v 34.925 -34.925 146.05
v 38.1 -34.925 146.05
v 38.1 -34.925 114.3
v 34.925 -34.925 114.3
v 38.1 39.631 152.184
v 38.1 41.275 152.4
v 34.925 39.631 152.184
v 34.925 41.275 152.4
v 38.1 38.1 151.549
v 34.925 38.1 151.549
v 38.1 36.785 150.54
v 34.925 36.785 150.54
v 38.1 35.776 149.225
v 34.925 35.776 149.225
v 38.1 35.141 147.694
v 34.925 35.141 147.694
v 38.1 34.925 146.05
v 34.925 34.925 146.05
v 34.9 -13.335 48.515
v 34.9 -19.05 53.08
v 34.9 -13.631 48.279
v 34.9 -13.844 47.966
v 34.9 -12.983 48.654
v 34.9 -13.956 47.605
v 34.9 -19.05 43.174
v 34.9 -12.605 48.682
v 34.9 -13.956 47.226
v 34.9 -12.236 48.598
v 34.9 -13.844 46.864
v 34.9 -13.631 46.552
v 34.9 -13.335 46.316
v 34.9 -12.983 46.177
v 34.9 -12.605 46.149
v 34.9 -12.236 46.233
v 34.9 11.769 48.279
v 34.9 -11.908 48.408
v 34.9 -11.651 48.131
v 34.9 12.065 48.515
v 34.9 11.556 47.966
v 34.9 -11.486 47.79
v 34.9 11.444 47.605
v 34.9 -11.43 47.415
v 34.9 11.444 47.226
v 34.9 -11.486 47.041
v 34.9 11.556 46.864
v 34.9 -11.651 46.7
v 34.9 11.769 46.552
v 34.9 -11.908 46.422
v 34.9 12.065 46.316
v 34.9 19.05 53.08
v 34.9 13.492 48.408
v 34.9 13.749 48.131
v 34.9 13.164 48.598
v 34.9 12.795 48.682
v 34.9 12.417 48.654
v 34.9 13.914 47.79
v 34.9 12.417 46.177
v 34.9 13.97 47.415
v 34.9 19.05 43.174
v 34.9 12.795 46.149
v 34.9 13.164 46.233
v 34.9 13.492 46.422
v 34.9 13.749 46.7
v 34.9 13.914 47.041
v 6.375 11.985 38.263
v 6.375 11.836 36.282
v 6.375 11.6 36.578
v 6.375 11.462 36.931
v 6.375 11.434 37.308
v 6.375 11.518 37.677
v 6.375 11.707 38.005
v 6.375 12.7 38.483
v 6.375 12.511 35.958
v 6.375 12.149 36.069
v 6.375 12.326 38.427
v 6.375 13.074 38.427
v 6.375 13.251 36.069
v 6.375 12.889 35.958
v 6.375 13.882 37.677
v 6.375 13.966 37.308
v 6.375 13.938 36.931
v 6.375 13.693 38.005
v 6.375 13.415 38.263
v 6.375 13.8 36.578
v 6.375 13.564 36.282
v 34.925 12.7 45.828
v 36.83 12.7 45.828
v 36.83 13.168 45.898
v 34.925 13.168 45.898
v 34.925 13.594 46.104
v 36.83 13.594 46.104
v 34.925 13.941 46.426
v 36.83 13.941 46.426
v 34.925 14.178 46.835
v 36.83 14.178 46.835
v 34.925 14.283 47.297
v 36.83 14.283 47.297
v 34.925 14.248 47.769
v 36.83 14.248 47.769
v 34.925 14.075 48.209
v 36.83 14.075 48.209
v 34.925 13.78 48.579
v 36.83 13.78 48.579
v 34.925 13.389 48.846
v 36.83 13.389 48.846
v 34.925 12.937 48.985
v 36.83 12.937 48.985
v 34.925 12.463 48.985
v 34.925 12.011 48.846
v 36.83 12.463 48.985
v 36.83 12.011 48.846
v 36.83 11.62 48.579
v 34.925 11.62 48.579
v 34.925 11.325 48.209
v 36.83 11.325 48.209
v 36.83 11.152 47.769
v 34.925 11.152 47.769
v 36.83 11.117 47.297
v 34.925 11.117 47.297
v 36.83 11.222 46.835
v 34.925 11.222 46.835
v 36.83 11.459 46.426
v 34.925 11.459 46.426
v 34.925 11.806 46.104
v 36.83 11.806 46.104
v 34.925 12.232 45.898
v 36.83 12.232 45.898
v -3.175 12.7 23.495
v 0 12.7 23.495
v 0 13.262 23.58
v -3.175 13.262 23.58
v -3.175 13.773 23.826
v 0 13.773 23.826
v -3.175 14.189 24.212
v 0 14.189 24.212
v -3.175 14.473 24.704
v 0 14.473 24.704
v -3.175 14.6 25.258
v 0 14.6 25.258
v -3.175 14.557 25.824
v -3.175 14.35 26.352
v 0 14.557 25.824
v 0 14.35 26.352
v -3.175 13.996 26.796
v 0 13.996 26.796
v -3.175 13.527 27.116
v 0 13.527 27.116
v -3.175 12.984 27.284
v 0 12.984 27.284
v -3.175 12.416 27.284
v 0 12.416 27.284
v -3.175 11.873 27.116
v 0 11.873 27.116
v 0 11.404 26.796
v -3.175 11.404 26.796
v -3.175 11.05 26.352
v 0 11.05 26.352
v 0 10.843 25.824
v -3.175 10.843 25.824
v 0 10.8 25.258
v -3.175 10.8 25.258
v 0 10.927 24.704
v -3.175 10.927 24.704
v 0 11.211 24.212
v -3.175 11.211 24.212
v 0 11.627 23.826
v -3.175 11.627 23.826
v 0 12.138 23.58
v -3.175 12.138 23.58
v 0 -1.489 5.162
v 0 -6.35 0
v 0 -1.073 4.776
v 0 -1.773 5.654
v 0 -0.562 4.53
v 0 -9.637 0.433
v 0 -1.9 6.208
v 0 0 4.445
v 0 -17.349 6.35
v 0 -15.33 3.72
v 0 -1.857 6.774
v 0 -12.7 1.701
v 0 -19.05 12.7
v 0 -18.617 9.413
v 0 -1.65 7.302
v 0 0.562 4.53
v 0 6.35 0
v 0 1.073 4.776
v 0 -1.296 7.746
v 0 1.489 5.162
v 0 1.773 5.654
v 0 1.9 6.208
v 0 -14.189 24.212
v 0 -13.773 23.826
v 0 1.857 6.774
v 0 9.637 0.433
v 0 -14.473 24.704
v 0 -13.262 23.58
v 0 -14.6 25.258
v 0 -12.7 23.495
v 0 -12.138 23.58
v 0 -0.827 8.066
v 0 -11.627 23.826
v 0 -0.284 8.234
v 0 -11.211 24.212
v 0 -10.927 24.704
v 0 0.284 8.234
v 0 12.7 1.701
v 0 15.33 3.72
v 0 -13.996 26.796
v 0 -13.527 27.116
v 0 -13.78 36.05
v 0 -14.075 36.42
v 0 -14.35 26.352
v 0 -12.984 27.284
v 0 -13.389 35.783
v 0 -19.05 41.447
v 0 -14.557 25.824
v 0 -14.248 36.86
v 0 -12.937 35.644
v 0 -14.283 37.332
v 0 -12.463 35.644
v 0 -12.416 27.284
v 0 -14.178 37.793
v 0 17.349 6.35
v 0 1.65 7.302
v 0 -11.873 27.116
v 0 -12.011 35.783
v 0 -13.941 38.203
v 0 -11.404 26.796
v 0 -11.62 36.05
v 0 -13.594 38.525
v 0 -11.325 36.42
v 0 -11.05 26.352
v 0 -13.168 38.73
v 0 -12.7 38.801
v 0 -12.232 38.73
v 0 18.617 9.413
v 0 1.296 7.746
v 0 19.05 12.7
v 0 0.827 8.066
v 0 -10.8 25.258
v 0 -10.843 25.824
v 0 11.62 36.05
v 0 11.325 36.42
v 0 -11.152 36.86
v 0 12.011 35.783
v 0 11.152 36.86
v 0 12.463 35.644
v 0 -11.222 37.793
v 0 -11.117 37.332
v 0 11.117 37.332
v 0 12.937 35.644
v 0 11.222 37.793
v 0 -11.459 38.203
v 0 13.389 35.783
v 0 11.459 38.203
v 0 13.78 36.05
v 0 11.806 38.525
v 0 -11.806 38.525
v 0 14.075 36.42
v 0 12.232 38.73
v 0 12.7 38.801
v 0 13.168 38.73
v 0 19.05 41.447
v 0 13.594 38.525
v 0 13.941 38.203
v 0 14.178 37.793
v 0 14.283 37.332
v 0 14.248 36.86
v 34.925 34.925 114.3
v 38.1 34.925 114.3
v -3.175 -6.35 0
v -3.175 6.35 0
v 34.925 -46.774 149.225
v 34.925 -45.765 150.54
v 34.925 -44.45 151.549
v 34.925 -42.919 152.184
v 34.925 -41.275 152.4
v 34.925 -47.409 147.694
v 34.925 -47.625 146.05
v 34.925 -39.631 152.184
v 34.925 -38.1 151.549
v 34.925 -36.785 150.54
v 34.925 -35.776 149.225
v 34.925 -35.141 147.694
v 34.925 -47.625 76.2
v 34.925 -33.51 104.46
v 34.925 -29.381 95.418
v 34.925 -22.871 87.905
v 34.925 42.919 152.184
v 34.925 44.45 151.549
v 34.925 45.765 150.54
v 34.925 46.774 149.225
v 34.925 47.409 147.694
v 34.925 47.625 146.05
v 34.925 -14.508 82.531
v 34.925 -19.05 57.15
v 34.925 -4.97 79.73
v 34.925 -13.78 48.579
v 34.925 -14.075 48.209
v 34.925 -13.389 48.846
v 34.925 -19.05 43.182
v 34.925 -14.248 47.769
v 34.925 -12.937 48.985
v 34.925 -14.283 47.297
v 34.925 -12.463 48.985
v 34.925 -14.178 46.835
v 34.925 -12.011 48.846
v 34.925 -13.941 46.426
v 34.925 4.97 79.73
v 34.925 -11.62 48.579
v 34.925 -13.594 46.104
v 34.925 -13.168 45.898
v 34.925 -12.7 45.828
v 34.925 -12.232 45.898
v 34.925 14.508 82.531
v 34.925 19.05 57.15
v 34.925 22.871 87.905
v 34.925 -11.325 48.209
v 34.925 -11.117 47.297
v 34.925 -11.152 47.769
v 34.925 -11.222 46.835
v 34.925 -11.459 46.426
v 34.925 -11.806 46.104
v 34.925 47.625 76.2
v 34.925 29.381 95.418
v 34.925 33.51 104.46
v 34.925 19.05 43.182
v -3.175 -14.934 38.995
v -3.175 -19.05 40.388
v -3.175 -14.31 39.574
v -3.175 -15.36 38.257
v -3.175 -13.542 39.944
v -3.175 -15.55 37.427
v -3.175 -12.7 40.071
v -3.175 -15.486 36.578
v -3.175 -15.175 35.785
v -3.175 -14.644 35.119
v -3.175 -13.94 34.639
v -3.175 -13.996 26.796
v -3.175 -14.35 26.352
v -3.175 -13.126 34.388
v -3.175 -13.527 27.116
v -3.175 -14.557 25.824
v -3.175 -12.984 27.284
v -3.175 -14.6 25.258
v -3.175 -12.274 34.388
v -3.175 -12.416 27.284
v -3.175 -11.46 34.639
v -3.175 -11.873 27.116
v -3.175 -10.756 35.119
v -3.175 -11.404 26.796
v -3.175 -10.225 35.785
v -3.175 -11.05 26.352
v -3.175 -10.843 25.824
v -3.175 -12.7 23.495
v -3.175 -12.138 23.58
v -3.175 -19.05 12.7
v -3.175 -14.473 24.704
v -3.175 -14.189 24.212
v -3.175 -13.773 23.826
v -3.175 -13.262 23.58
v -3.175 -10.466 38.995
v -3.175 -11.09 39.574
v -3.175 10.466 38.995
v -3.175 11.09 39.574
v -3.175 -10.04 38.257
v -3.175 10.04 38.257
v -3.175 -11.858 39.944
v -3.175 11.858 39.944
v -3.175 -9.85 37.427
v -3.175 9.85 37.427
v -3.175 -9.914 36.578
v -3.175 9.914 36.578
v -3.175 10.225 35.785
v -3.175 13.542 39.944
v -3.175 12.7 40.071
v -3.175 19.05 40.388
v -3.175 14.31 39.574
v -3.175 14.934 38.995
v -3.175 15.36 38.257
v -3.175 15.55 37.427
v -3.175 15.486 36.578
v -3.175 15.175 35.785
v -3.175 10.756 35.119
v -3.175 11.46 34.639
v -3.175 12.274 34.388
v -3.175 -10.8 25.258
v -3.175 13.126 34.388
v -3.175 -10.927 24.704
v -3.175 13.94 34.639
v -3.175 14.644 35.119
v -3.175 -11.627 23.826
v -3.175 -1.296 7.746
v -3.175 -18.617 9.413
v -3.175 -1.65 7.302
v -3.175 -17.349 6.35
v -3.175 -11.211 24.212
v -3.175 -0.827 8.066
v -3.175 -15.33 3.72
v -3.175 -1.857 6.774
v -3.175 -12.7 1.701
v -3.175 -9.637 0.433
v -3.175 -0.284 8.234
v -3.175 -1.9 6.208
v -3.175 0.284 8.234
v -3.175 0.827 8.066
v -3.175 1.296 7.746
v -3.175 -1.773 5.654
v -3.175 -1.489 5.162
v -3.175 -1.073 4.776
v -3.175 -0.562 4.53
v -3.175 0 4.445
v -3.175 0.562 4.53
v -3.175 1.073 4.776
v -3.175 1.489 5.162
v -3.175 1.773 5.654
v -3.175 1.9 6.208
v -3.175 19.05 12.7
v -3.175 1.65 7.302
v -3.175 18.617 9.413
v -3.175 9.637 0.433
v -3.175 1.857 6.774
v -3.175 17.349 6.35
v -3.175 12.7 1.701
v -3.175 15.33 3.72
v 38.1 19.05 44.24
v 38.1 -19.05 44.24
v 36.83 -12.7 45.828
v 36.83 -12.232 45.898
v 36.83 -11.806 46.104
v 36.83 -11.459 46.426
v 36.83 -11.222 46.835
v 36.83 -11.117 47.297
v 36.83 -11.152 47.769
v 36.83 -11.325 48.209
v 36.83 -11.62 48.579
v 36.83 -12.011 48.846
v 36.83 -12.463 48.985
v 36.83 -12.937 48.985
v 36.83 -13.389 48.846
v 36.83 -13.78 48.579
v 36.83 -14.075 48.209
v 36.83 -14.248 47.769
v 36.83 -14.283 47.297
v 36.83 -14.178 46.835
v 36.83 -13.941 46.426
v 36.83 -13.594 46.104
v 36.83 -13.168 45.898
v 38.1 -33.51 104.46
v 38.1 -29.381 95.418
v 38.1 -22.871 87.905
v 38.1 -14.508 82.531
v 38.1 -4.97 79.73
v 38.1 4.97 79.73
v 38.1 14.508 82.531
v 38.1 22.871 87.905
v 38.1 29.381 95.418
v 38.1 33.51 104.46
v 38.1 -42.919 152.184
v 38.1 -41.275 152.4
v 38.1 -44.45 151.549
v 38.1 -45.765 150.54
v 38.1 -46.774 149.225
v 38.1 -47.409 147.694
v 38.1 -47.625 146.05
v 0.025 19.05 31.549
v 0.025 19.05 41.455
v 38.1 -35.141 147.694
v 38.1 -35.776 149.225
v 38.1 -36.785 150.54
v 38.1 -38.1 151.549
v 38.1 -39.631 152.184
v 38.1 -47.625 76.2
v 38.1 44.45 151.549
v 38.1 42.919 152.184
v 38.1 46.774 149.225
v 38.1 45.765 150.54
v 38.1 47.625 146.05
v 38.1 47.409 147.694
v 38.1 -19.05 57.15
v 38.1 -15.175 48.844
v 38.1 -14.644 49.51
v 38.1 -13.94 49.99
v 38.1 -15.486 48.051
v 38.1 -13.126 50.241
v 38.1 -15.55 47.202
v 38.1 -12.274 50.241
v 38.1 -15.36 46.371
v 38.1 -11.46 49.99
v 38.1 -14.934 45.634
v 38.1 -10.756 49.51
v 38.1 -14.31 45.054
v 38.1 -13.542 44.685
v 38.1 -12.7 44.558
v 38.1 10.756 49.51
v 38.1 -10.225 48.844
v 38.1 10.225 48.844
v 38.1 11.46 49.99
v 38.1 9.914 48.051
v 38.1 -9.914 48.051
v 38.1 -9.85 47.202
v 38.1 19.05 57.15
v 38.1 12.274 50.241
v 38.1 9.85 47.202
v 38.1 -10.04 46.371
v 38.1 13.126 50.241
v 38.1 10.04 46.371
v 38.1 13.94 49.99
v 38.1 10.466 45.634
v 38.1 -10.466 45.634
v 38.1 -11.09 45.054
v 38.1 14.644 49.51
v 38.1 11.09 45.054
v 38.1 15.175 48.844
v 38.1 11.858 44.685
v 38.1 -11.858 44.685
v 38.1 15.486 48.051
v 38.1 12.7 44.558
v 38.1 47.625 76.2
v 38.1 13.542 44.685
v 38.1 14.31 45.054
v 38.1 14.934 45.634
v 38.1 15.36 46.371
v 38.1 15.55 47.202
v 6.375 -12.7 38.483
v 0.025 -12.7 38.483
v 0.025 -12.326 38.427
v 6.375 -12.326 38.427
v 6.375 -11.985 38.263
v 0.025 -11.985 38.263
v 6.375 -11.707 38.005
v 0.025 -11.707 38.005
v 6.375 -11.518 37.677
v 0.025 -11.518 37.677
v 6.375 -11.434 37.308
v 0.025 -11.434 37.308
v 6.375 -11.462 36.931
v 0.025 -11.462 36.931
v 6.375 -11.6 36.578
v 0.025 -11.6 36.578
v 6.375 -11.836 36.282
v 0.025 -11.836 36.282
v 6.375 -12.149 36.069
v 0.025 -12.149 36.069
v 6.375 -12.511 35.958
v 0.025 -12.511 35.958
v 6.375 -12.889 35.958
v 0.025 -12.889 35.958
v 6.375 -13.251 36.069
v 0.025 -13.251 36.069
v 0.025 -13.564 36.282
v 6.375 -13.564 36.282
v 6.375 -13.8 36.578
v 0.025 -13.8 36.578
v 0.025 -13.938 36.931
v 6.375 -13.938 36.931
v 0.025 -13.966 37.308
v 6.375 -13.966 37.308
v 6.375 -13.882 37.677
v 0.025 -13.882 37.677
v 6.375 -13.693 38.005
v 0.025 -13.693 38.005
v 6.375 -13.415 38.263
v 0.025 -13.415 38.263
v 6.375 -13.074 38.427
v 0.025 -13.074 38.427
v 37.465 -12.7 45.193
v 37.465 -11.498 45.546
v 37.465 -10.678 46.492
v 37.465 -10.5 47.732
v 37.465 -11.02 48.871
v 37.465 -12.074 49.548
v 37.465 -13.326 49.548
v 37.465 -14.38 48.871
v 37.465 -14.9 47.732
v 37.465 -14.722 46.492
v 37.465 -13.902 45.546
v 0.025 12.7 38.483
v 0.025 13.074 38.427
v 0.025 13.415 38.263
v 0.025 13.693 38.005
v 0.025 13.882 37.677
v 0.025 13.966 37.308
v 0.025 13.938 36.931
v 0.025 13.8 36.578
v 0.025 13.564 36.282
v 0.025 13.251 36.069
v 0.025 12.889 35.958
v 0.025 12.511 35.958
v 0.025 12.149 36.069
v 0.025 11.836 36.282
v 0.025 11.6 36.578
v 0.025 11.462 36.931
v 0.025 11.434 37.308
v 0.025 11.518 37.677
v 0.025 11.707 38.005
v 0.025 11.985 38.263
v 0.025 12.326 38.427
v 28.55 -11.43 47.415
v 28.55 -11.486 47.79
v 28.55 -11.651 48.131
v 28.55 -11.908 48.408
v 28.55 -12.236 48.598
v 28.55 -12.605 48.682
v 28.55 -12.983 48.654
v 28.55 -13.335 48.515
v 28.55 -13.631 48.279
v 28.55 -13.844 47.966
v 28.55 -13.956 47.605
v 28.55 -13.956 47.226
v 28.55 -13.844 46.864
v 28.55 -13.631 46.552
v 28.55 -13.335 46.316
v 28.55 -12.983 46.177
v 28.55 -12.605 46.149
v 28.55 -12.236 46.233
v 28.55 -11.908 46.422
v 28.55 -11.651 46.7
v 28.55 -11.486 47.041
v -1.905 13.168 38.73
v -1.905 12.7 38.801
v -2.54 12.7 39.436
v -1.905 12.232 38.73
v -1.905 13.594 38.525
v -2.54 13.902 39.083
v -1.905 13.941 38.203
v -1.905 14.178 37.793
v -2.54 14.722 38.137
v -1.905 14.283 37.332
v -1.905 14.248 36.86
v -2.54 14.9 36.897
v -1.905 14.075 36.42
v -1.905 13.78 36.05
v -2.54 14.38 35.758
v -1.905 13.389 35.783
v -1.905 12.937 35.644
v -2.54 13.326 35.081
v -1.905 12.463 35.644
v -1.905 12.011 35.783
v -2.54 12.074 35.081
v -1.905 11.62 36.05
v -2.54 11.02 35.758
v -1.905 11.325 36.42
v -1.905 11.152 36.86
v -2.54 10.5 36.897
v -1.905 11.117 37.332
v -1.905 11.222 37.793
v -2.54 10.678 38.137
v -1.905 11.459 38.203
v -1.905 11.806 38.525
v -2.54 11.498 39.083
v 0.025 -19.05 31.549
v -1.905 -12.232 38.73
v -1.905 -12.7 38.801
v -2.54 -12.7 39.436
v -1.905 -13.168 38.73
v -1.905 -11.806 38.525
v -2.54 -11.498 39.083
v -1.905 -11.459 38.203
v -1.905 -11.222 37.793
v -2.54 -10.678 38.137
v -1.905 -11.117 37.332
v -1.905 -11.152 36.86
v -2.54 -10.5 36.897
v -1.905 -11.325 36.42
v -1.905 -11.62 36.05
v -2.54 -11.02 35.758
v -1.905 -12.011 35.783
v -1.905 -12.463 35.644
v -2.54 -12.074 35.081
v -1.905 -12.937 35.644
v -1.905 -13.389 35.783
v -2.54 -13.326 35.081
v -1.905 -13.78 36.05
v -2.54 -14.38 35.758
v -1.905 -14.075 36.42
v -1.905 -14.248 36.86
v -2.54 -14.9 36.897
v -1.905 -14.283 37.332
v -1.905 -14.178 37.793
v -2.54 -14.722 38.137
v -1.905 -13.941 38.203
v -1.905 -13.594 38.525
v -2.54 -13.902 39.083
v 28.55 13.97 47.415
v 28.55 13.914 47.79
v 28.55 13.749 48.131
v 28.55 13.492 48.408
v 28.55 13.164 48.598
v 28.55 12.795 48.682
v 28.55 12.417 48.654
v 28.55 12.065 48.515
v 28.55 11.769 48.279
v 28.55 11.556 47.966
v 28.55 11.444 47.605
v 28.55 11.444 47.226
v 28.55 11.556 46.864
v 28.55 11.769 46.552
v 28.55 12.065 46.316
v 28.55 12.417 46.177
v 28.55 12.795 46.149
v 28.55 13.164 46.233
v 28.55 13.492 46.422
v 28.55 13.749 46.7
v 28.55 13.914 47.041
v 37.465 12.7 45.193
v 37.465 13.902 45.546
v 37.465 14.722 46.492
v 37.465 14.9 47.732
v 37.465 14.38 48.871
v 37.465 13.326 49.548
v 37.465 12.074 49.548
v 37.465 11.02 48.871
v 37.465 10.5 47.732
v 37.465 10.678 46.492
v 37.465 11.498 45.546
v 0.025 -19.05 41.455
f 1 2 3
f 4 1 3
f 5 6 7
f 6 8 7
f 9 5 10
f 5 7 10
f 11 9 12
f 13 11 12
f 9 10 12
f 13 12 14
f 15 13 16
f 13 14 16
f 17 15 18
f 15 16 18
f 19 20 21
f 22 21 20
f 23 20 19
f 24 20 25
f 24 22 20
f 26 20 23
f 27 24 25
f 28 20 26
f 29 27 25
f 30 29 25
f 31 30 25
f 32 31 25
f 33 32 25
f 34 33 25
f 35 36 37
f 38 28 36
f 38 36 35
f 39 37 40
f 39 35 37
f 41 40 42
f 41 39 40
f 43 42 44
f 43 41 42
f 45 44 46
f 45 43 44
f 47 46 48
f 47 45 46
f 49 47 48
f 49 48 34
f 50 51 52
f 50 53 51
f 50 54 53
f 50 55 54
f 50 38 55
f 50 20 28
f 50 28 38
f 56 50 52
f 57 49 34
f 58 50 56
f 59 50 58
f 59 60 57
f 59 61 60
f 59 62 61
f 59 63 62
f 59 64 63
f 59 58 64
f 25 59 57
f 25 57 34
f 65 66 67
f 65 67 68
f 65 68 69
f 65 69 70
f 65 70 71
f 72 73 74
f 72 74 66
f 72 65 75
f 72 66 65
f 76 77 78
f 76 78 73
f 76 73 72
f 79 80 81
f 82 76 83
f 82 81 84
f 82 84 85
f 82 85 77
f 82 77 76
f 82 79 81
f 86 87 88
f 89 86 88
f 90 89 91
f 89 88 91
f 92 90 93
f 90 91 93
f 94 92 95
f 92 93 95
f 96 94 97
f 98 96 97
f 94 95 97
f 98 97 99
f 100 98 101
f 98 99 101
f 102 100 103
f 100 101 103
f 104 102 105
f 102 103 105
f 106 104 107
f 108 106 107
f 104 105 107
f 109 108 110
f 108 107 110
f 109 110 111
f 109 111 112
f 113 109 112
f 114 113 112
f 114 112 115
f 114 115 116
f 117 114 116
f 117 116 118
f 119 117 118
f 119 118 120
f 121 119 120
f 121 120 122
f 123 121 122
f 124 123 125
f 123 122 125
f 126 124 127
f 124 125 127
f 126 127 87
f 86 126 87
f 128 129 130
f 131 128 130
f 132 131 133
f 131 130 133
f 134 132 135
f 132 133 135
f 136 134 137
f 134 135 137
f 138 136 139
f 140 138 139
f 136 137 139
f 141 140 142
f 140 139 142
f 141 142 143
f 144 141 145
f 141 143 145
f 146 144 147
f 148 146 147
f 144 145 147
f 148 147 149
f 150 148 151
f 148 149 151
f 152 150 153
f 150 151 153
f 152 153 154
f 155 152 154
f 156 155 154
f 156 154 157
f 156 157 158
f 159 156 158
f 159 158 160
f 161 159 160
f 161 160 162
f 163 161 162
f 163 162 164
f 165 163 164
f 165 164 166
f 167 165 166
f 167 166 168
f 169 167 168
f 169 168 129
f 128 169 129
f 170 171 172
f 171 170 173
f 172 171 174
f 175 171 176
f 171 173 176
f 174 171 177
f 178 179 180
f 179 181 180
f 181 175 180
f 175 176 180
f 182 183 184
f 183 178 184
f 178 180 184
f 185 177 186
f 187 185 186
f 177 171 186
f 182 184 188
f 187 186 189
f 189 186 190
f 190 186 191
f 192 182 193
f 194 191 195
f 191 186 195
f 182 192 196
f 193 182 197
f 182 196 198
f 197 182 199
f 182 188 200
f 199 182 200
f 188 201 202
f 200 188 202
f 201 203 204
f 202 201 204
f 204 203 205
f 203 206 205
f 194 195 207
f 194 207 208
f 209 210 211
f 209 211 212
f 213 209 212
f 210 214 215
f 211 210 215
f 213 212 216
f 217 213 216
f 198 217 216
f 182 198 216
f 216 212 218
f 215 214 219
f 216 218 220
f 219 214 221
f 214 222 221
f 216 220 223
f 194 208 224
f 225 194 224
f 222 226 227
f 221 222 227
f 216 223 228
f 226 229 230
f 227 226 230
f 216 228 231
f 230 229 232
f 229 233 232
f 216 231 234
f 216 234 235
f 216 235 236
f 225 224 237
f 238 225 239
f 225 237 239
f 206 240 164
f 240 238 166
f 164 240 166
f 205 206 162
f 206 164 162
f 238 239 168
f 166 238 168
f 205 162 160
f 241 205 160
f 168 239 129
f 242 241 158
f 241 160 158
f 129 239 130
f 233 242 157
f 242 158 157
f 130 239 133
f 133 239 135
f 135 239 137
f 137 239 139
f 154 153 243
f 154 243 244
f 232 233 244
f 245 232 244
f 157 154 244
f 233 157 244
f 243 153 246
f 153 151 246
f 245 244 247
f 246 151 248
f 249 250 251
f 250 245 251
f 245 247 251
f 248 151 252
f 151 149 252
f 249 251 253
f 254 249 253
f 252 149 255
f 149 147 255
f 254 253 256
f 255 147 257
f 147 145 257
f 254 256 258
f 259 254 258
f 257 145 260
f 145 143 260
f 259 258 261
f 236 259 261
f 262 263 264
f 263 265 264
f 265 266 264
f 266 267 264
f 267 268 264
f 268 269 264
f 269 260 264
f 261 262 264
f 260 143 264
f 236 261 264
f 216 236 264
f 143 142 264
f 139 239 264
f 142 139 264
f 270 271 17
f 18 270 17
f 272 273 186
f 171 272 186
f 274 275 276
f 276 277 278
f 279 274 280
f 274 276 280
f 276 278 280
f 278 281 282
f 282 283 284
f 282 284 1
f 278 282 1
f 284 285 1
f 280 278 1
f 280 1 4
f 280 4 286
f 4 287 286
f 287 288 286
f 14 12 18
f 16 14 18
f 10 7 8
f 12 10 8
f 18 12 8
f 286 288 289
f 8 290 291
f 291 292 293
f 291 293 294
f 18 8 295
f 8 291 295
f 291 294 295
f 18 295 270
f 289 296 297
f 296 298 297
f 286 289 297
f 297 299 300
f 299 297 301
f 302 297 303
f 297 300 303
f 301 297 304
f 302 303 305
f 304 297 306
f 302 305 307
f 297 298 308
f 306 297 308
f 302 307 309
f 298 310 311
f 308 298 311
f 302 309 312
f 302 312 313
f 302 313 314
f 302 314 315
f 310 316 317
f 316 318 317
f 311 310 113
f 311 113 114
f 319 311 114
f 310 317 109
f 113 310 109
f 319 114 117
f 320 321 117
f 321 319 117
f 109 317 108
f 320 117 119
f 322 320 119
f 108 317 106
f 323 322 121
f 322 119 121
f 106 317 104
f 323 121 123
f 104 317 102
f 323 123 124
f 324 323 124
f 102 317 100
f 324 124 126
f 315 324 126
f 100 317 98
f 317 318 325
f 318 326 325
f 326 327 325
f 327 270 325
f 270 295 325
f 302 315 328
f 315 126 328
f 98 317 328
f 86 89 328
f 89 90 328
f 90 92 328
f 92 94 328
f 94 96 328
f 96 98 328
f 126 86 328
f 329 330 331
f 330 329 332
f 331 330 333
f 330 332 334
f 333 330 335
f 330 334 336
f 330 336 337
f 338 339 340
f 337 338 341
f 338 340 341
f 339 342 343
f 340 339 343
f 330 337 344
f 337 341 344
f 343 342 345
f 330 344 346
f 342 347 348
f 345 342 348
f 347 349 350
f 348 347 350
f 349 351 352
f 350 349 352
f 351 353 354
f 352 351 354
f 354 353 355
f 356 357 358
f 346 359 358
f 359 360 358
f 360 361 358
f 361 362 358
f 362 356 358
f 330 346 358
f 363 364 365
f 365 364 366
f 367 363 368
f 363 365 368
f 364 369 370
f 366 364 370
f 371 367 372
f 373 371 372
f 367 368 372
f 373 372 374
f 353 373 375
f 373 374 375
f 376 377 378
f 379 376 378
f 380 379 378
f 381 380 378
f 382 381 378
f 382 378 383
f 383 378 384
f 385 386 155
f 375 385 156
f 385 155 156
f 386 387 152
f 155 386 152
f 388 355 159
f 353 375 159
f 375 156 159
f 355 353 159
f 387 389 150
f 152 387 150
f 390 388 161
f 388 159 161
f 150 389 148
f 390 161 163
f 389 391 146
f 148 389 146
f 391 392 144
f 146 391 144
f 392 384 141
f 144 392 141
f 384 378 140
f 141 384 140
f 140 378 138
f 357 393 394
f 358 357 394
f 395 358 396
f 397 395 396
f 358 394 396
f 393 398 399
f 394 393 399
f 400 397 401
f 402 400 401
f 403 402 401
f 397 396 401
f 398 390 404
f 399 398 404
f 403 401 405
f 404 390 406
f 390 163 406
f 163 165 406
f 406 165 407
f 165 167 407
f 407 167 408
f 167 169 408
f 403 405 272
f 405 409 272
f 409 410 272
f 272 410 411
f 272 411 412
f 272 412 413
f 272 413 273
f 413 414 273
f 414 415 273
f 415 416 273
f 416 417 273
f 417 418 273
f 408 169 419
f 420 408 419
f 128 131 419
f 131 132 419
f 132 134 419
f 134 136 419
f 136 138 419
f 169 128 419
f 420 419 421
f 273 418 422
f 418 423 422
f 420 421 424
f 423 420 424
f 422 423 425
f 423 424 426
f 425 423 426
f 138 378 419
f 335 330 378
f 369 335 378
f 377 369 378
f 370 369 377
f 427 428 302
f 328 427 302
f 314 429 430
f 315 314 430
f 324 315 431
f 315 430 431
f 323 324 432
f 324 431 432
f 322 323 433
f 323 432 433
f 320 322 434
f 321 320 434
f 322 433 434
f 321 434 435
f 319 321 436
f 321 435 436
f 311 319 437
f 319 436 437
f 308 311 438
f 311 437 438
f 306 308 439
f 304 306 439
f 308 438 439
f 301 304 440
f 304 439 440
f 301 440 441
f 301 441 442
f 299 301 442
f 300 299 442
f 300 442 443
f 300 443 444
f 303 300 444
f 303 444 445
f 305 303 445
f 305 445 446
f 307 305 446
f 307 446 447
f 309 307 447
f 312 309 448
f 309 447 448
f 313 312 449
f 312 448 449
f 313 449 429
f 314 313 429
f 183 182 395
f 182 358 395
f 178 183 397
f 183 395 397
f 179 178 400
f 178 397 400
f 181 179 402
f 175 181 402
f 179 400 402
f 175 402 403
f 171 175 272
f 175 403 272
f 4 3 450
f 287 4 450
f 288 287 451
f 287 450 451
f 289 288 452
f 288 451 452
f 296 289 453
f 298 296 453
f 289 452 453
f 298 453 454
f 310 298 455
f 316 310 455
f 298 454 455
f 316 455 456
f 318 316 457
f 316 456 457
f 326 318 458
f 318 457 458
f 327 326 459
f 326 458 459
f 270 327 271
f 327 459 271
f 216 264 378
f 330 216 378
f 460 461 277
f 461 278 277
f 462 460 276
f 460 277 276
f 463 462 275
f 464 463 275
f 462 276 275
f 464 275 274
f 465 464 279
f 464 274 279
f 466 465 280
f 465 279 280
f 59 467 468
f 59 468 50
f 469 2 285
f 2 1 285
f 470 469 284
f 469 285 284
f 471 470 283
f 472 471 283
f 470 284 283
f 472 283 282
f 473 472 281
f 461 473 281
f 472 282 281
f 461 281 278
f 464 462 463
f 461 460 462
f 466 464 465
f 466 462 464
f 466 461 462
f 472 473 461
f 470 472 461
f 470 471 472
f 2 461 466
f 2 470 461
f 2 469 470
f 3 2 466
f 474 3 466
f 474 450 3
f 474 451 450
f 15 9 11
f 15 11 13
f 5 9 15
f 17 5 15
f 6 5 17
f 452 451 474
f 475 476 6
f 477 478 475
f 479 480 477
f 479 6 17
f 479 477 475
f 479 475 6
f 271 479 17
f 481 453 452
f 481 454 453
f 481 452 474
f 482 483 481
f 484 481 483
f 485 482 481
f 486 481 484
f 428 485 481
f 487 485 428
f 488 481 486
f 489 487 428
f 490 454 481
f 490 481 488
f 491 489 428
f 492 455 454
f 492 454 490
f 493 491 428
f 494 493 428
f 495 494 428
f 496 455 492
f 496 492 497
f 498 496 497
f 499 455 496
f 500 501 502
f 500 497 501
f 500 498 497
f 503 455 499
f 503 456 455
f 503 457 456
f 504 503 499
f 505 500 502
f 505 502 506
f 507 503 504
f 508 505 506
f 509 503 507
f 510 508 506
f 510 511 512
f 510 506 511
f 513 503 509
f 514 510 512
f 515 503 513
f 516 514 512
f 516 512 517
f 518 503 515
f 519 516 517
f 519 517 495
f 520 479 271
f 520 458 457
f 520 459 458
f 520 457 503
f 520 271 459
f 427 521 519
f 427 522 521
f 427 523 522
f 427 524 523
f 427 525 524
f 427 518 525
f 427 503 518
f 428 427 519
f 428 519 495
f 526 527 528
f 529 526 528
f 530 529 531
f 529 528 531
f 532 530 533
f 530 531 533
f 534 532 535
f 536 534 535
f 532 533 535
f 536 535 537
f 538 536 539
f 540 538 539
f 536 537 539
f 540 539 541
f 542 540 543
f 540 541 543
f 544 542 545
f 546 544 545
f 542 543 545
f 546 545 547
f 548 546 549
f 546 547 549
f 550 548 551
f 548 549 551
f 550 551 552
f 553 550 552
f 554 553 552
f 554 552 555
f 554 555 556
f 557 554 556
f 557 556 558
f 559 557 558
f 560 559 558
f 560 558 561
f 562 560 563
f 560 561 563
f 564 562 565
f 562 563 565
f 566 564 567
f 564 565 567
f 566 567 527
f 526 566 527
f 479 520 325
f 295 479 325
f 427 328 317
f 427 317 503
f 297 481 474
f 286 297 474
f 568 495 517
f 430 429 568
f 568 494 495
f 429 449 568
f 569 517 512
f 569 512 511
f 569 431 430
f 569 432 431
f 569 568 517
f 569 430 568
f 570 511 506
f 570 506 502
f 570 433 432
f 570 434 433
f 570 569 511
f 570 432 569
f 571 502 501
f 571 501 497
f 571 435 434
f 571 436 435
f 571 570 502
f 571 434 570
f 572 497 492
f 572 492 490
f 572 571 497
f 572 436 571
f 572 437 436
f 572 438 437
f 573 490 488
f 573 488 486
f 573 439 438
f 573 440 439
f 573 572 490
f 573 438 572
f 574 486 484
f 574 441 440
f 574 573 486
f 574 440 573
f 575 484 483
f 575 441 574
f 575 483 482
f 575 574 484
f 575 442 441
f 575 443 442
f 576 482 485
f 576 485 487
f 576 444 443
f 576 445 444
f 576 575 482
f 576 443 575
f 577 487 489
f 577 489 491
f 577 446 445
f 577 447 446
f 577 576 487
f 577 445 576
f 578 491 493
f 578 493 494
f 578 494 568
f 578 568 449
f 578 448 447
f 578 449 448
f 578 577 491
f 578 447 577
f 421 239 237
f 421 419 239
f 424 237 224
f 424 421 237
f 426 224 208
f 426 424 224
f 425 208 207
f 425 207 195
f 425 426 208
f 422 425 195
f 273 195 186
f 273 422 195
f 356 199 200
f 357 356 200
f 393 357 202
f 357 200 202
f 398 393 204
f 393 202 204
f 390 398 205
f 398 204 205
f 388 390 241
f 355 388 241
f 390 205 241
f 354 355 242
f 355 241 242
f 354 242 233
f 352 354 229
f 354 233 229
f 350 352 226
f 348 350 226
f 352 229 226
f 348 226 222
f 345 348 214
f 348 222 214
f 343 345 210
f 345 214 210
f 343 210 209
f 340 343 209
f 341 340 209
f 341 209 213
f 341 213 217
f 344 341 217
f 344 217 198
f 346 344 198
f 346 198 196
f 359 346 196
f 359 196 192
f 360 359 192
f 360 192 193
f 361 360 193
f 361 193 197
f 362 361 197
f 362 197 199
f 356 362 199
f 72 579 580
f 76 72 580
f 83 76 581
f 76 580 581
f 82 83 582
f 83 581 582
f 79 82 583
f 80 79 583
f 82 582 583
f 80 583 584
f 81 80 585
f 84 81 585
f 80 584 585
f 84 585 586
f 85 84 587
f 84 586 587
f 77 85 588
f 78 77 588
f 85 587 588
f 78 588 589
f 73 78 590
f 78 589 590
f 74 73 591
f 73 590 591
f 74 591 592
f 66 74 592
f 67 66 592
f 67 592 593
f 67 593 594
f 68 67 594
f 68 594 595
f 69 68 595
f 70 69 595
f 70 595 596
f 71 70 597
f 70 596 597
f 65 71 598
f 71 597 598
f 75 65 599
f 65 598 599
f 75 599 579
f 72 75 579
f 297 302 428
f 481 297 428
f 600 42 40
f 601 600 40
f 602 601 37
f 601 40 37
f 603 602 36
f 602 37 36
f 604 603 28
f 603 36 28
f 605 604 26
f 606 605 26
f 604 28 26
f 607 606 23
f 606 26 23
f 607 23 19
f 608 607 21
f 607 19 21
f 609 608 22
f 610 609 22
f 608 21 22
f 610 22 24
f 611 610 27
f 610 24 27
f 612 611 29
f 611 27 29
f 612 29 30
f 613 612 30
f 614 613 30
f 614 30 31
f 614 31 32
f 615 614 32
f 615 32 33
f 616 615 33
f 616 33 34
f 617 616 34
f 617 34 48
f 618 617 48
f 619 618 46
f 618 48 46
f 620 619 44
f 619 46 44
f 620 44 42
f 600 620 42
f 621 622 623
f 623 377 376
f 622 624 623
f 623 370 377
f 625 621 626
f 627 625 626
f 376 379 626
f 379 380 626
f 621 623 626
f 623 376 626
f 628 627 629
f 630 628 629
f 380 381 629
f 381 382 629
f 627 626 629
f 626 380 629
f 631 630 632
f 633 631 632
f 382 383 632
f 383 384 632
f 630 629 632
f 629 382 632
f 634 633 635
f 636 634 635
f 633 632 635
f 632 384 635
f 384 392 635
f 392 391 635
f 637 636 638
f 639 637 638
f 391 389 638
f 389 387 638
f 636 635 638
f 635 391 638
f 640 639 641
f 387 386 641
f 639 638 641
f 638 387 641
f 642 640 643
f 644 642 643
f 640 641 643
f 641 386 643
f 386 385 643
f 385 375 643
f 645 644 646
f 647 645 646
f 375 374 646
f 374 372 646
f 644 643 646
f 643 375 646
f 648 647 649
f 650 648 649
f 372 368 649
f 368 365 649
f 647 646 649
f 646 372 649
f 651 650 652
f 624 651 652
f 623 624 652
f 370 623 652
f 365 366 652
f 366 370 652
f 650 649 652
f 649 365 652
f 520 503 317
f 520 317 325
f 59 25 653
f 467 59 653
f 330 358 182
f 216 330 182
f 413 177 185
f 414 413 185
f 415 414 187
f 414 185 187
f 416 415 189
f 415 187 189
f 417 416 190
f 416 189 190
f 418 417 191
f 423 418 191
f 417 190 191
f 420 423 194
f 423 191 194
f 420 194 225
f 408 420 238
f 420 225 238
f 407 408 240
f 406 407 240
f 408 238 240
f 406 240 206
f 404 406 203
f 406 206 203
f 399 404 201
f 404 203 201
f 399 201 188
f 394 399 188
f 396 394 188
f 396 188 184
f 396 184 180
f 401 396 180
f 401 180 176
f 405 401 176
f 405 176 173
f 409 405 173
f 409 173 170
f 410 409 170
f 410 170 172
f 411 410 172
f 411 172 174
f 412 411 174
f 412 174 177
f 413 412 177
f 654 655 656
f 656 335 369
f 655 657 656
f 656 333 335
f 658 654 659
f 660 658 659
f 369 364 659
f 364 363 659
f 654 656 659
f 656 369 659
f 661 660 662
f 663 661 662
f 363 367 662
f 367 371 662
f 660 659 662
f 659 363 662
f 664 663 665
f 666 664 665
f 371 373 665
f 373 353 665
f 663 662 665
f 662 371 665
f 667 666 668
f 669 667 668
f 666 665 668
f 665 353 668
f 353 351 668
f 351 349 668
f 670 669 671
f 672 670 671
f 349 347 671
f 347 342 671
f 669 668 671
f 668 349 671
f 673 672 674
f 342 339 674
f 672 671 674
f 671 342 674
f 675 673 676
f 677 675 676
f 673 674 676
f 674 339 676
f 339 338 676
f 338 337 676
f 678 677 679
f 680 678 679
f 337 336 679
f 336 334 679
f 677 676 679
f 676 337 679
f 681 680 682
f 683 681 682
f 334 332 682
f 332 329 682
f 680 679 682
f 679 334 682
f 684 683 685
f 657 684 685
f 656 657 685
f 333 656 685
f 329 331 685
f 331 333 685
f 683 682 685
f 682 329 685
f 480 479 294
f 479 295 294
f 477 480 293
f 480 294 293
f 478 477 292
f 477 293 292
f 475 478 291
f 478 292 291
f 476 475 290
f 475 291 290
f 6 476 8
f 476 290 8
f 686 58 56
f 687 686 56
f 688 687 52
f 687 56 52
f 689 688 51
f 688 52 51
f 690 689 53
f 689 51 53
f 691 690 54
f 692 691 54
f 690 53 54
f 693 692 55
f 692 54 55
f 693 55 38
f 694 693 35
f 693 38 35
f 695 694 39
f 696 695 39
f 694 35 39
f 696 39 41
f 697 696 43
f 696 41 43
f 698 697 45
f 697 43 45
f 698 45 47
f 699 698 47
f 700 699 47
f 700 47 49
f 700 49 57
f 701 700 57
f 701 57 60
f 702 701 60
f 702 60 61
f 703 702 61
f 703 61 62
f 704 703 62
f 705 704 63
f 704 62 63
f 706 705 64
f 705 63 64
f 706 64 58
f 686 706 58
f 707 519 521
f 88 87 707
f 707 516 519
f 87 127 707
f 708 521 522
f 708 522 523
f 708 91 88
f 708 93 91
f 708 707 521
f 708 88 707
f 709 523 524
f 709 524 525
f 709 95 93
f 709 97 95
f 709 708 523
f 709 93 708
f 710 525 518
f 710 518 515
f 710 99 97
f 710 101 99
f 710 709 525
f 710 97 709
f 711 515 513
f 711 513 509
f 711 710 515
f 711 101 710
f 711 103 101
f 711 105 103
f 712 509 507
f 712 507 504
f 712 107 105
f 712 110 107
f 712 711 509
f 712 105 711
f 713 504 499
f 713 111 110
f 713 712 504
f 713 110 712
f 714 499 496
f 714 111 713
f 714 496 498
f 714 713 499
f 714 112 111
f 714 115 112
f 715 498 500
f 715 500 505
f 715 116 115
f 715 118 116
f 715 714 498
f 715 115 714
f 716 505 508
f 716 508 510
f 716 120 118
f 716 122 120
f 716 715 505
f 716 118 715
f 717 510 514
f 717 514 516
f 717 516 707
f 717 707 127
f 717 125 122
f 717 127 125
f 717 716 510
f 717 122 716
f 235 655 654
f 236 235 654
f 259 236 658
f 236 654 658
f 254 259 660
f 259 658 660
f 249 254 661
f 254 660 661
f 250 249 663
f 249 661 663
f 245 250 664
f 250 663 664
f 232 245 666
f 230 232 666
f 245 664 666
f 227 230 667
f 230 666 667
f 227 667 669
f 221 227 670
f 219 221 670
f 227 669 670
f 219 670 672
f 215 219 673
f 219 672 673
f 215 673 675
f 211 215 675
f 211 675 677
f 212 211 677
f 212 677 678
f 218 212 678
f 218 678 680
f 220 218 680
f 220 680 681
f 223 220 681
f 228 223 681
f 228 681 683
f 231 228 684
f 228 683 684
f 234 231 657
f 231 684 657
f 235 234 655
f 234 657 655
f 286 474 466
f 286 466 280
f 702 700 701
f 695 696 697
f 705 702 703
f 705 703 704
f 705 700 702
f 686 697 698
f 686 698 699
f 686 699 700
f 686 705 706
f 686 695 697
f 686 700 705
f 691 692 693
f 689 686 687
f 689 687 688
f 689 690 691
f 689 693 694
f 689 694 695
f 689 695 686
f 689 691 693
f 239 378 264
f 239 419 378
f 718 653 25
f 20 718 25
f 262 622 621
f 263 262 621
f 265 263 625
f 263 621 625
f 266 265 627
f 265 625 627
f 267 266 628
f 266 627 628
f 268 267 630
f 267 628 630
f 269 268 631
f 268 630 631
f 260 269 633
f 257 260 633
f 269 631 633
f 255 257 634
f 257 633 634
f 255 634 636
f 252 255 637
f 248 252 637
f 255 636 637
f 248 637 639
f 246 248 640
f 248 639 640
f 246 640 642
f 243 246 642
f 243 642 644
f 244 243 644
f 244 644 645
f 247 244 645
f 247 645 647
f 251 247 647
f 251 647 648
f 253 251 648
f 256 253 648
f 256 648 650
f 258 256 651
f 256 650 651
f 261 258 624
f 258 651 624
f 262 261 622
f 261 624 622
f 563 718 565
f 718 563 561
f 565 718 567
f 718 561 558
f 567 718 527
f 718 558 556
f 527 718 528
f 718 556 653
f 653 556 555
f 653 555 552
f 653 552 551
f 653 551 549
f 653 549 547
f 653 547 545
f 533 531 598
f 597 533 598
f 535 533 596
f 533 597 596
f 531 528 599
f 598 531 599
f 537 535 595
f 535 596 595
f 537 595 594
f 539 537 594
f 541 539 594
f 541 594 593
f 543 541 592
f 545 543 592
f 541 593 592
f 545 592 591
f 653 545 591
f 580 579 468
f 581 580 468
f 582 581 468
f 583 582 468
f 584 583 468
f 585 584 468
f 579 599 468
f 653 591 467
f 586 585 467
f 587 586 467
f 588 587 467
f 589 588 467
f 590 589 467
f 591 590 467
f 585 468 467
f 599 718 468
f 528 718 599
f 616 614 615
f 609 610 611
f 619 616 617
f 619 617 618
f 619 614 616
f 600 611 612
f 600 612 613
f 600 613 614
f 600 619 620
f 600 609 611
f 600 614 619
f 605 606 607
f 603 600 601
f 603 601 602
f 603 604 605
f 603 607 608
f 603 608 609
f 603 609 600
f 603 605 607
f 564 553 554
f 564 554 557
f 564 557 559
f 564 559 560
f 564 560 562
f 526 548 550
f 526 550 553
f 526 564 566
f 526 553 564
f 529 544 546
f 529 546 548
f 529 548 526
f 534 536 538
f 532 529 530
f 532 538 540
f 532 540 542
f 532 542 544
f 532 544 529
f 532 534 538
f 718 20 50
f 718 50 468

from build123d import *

# Parameters (mm, degrees)
BOSS_EXTRUDE1_DEPTH = 47.625
CUT_EXTRUDE1_DEPTH  = 165.916725198
FILLET1_R           = 6.35
FILLET2_R           = 12.7
CUT_EXTRUDE2_REACH  = 166.151
SKETCH3_R           = 1.905
BOSS_EXTRUDE2_DEPTH = 38.1
SKETCH6_W           = 0.0254
SKETCH6_H           = 12.687385225
SKETCH6_H_2         = 17.118946269
CUT_EXTRUDE3_DEPTH  = 171.65440406
SKETCH7_R           = 1.5875
CUT_EXTRUDE4_DEPTH  = 3.175
SKETCH8_R           = 1.27
CUT_EXTRUDE5_DEPTH  = 6.35
SKETCH9_R           = 1.5875
CUT_EXTRUDE6_DEPTH  = 3.175
SKETCH10_R          = 1.27
CUT_EXTRUDE7_DEPTH  = 6.35
CHAMFER1_SIZE       = 1.27
CHAMFER2_SIZE       = 1.27


with BuildPart() as part:
    # Sketch1 → Boss-Extrude1 (new, symmetric)
    with BuildSketch(Plane(origin=(0, 0, 0), x_dir=(1, 0, 0), z_dir=(0, 1, 0))):
        Polygon((0, 0), (0, -38.1), (38.1, -50.8), (38.1, -152.4), (34.925, -152.4), (34.925, -53.088410524), (-3.175, -40.388410524), (-3.175, 0), align=None)
    extrude(amount=BOSS_EXTRUDE1_DEPTH, both=True)

    # Sketch2 → Cut-Extrude1 (cut, through all)
    with BuildSketch(Plane(origin=(38.1, 0, 0), x_dir=(0, 0, -1), z_dir=(1, 0, 0))):
        with BuildLine():
            Line((-114.3, 34.925), (-152.4, 34.925))
            Line((-152.4, 34.925), (-152.4, -34.925))
            Line((-152.4, -34.925), (-114.3, -34.925))
            ThreePointArc((-114.3, -34.925), (-79.375, 0), (-114.3, 34.925))
        make_face()
        Polygon((0, 19.05), (-57.15, 19.05), (-76.2, 47.625), (0, 47.625), align=None)
        Polygon((0, -47.625), (0, -19.05), (-57.15, -19.05), (-76.2, -47.625), align=None)
    extrude(amount=-CUT_EXTRUDE1_DEPTH, mode=Mode.SUBTRACT)

    # Fillet1
    fillet1_edges = [part.edges().sort_by_distance(p)[0] for p in [
        (36.5125, -47.625, 152.4),
        (36.5125, -34.925, 152.4),
        (36.5125, 47.625, 152.4),
        (36.5125, 34.925, 152.4),
    ]]
    fillet(fillet1_edges, radius=FILLET1_R - 0.0001)  # a hair under: the kernel refuses the full size

    # Fillet2
    fillet2_edges = [part.edges().sort_by_distance(p)[0] for p in [
        (-1.5875, 19.05, 0),
        (-1.5875, -19.05, 0),
    ]]
    fillet(fillet2_edges, radius=FILLET2_R)

    # Sketch3 → Cut-Extrude2 (cut, up to next)
    with BuildSketch(Plane(origin=(0, 0, 0), x_dir=(0, 0, -1), z_dir=(1, 0, 0)), mode=Mode.PRIVATE) as cut_extrude2_sk1:
        with Locations((-25.4, 12.7)):
            Circle(SKETCH3_R)
    cut_extrude2_tool1 = extrude(cut_extrude2_sk1.sketch, amount=-CUT_EXTRUDE2_REACH, mode=Mode.PRIVATE) & part.part
    # Sketch3 → Cut-Extrude2 (cut, up to next)
    with BuildSketch(Plane(origin=(0, 0, 0), x_dir=(0, 0, -1), z_dir=(1, 0, 0)), mode=Mode.PRIVATE) as cut_extrude2_sk2:
        with Locations((-6.35, 0)):
            Circle(SKETCH3_R)
    cut_extrude2_tool2 = extrude(cut_extrude2_sk2.sketch, amount=-CUT_EXTRUDE2_REACH, mode=Mode.PRIVATE) & part.part
    # Sketch3 → Cut-Extrude2 (cut, up to next)
    with BuildSketch(Plane(origin=(0, 0, 0), x_dir=(0, 0, -1), z_dir=(1, 0, 0)), mode=Mode.PRIVATE) as cut_extrude2_sk3:
        with Locations((-25.4, -12.7)):
            Circle(SKETCH3_R)
    cut_extrude2_tool3 = extrude(cut_extrude2_sk3.sketch, amount=-CUT_EXTRUDE2_REACH, mode=Mode.PRIVATE) & part.part
    add(cut_extrude2_tool1.solids().sort_by_distance((0, 12.7, 25.4))[0], mode=Mode.SUBTRACT)
    add(cut_extrude2_tool2.solids().sort_by_distance((0, 0, 6.35))[0], mode=Mode.SUBTRACT)
    add(cut_extrude2_tool3.solids().sort_by_distance((0, -12.7, 25.4))[0], mode=Mode.SUBTRACT)

    # Sketch5 → Boss-Extrude2 (add)
    with BuildSketch(Plane(origin=(0, 19.05, 0), x_dir=(1, 0, 0), z_dir=(0, 1, 0))):
        Polygon((38.1, -50.8), (38.1, -44.24038204), (0, -31.54038204), (0, -38.1), align=None)
    extrude(amount=-BOSS_EXTRUDE2_DEPTH)

    # Sketch6 → Cut-Extrude3 (cut, through all)
    with BuildSketch(Plane(origin=(0, 19.05, 0), x_dir=(1, 0, 0), z_dir=(0, 1, 0))):
        with Locations((34.9123, -46.744717912)):
            Rectangle(SKETCH6_W, SKETCH6_H)
        with Locations((0.0127, -40.099855175)):
            Rectangle(SKETCH6_W, SKETCH6_H_2)
    extrude(amount=-CUT_EXTRUDE3_DEPTH, mode=Mode.SUBTRACT)


with BuildPart() as cut_extrude3_piece_1:
    # of the separate pieces the step leaves, piece 1, a body of its own (cut_extrude3_pieces)
    add(part.part.solids().sort_by_distance((38.1, 19.05, 44.24038204))[0])

    # Sketch7 → Cut-Extrude4 (cut)
    with BuildSketch(Plane(origin=(38.1, 0, 0), x_dir=(0, 0, -1), z_dir=(1, 0, 0))):
        with Locations((-47.41538204, 12.7)):
            Circle(SKETCH7_R)
        with Locations((-47.41538204, -12.7)):
            Circle(SKETCH7_R)
    extrude(amount=-CUT_EXTRUDE4_DEPTH, mode=Mode.SUBTRACT)

    # Chamfer1
    chamfer1_edges = [cut_extrude3_piece_1.edges().sort_by_distance(p)[0] for p in [
        (38.1, 12.7, 49.00288204),
        (38.1, -12.7, 49.00288204),
    ]]
    chamfer(chamfer1_edges, length=CHAMFER1_SIZE)


with BuildPart() as cut_extrude3_piece_2:
    # of the separate pieces the step leaves, piece 2, a body of its own (cut_extrude3_pieces)
    add(part.part.solids().sort_by_distance((34.8996, 19.05, 43.17358204))[0])

    # Sketch8 → Cut-Extrude5 (cut)
    with BuildSketch(Plane(origin=(34.8996, 0, 0), x_dir=(0, 0, -1), z_dir=(1, 0, 0))):
        with Locations(Location((-47.41538204, 12.7, 0), (0, 0, 90))):
            Circle(SKETCH8_R)
        with Locations(Location((-47.41538204, -12.7, 0), (0, 0, 90))):
            Circle(SKETCH8_R)
    extrude(amount=-CUT_EXTRUDE5_DEPTH, mode=Mode.SUBTRACT)

    # Sketch10 → Cut-Extrude7 (cut)
    with BuildSketch(Plane.ZY.offset(-0.0254)):
        with Locations((37.213410524, 12.7)):
            Circle(SKETCH10_R)
        with Locations((37.213410524, -12.7)):
            Circle(SKETCH10_R)
    extrude(amount=-CUT_EXTRUDE7_DEPTH, mode=Mode.SUBTRACT)


with BuildPart() as cut_extrude3_piece_3:
    # of the separate pieces the step leaves, piece 3, a body of its own (cut_extrude3_pieces)
    add(part.part.solids().sort_by_distance((0, 19.05, 41.446743857))[0])

    # Sketch9 → Cut-Extrude6 (cut)
    with BuildSketch(Plane.ZY.offset(3.175)):
        with Locations((37.213410524, 12.7)):
            Circle(SKETCH9_R)
        with Locations((37.213410524, -12.7)):
            Circle(SKETCH9_R)
    extrude(amount=-CUT_EXTRUDE6_DEPTH, mode=Mode.SUBTRACT)

    # Chamfer2
    chamfer2_edges = [cut_extrude3_piece_3.edges().sort_by_distance(p)[0] for p in [
        (-3.175, 12.7, 35.625910524),
        (-3.175, -12.7, 35.625910524),
    ]]
    chamfer(chamfer2_edges, length=CHAMFER2_SIZE)


solid = Compound([cut_extrude3_piece_1.part, cut_extrude3_piece_2.part, cut_extrude3_piece_3.part])
